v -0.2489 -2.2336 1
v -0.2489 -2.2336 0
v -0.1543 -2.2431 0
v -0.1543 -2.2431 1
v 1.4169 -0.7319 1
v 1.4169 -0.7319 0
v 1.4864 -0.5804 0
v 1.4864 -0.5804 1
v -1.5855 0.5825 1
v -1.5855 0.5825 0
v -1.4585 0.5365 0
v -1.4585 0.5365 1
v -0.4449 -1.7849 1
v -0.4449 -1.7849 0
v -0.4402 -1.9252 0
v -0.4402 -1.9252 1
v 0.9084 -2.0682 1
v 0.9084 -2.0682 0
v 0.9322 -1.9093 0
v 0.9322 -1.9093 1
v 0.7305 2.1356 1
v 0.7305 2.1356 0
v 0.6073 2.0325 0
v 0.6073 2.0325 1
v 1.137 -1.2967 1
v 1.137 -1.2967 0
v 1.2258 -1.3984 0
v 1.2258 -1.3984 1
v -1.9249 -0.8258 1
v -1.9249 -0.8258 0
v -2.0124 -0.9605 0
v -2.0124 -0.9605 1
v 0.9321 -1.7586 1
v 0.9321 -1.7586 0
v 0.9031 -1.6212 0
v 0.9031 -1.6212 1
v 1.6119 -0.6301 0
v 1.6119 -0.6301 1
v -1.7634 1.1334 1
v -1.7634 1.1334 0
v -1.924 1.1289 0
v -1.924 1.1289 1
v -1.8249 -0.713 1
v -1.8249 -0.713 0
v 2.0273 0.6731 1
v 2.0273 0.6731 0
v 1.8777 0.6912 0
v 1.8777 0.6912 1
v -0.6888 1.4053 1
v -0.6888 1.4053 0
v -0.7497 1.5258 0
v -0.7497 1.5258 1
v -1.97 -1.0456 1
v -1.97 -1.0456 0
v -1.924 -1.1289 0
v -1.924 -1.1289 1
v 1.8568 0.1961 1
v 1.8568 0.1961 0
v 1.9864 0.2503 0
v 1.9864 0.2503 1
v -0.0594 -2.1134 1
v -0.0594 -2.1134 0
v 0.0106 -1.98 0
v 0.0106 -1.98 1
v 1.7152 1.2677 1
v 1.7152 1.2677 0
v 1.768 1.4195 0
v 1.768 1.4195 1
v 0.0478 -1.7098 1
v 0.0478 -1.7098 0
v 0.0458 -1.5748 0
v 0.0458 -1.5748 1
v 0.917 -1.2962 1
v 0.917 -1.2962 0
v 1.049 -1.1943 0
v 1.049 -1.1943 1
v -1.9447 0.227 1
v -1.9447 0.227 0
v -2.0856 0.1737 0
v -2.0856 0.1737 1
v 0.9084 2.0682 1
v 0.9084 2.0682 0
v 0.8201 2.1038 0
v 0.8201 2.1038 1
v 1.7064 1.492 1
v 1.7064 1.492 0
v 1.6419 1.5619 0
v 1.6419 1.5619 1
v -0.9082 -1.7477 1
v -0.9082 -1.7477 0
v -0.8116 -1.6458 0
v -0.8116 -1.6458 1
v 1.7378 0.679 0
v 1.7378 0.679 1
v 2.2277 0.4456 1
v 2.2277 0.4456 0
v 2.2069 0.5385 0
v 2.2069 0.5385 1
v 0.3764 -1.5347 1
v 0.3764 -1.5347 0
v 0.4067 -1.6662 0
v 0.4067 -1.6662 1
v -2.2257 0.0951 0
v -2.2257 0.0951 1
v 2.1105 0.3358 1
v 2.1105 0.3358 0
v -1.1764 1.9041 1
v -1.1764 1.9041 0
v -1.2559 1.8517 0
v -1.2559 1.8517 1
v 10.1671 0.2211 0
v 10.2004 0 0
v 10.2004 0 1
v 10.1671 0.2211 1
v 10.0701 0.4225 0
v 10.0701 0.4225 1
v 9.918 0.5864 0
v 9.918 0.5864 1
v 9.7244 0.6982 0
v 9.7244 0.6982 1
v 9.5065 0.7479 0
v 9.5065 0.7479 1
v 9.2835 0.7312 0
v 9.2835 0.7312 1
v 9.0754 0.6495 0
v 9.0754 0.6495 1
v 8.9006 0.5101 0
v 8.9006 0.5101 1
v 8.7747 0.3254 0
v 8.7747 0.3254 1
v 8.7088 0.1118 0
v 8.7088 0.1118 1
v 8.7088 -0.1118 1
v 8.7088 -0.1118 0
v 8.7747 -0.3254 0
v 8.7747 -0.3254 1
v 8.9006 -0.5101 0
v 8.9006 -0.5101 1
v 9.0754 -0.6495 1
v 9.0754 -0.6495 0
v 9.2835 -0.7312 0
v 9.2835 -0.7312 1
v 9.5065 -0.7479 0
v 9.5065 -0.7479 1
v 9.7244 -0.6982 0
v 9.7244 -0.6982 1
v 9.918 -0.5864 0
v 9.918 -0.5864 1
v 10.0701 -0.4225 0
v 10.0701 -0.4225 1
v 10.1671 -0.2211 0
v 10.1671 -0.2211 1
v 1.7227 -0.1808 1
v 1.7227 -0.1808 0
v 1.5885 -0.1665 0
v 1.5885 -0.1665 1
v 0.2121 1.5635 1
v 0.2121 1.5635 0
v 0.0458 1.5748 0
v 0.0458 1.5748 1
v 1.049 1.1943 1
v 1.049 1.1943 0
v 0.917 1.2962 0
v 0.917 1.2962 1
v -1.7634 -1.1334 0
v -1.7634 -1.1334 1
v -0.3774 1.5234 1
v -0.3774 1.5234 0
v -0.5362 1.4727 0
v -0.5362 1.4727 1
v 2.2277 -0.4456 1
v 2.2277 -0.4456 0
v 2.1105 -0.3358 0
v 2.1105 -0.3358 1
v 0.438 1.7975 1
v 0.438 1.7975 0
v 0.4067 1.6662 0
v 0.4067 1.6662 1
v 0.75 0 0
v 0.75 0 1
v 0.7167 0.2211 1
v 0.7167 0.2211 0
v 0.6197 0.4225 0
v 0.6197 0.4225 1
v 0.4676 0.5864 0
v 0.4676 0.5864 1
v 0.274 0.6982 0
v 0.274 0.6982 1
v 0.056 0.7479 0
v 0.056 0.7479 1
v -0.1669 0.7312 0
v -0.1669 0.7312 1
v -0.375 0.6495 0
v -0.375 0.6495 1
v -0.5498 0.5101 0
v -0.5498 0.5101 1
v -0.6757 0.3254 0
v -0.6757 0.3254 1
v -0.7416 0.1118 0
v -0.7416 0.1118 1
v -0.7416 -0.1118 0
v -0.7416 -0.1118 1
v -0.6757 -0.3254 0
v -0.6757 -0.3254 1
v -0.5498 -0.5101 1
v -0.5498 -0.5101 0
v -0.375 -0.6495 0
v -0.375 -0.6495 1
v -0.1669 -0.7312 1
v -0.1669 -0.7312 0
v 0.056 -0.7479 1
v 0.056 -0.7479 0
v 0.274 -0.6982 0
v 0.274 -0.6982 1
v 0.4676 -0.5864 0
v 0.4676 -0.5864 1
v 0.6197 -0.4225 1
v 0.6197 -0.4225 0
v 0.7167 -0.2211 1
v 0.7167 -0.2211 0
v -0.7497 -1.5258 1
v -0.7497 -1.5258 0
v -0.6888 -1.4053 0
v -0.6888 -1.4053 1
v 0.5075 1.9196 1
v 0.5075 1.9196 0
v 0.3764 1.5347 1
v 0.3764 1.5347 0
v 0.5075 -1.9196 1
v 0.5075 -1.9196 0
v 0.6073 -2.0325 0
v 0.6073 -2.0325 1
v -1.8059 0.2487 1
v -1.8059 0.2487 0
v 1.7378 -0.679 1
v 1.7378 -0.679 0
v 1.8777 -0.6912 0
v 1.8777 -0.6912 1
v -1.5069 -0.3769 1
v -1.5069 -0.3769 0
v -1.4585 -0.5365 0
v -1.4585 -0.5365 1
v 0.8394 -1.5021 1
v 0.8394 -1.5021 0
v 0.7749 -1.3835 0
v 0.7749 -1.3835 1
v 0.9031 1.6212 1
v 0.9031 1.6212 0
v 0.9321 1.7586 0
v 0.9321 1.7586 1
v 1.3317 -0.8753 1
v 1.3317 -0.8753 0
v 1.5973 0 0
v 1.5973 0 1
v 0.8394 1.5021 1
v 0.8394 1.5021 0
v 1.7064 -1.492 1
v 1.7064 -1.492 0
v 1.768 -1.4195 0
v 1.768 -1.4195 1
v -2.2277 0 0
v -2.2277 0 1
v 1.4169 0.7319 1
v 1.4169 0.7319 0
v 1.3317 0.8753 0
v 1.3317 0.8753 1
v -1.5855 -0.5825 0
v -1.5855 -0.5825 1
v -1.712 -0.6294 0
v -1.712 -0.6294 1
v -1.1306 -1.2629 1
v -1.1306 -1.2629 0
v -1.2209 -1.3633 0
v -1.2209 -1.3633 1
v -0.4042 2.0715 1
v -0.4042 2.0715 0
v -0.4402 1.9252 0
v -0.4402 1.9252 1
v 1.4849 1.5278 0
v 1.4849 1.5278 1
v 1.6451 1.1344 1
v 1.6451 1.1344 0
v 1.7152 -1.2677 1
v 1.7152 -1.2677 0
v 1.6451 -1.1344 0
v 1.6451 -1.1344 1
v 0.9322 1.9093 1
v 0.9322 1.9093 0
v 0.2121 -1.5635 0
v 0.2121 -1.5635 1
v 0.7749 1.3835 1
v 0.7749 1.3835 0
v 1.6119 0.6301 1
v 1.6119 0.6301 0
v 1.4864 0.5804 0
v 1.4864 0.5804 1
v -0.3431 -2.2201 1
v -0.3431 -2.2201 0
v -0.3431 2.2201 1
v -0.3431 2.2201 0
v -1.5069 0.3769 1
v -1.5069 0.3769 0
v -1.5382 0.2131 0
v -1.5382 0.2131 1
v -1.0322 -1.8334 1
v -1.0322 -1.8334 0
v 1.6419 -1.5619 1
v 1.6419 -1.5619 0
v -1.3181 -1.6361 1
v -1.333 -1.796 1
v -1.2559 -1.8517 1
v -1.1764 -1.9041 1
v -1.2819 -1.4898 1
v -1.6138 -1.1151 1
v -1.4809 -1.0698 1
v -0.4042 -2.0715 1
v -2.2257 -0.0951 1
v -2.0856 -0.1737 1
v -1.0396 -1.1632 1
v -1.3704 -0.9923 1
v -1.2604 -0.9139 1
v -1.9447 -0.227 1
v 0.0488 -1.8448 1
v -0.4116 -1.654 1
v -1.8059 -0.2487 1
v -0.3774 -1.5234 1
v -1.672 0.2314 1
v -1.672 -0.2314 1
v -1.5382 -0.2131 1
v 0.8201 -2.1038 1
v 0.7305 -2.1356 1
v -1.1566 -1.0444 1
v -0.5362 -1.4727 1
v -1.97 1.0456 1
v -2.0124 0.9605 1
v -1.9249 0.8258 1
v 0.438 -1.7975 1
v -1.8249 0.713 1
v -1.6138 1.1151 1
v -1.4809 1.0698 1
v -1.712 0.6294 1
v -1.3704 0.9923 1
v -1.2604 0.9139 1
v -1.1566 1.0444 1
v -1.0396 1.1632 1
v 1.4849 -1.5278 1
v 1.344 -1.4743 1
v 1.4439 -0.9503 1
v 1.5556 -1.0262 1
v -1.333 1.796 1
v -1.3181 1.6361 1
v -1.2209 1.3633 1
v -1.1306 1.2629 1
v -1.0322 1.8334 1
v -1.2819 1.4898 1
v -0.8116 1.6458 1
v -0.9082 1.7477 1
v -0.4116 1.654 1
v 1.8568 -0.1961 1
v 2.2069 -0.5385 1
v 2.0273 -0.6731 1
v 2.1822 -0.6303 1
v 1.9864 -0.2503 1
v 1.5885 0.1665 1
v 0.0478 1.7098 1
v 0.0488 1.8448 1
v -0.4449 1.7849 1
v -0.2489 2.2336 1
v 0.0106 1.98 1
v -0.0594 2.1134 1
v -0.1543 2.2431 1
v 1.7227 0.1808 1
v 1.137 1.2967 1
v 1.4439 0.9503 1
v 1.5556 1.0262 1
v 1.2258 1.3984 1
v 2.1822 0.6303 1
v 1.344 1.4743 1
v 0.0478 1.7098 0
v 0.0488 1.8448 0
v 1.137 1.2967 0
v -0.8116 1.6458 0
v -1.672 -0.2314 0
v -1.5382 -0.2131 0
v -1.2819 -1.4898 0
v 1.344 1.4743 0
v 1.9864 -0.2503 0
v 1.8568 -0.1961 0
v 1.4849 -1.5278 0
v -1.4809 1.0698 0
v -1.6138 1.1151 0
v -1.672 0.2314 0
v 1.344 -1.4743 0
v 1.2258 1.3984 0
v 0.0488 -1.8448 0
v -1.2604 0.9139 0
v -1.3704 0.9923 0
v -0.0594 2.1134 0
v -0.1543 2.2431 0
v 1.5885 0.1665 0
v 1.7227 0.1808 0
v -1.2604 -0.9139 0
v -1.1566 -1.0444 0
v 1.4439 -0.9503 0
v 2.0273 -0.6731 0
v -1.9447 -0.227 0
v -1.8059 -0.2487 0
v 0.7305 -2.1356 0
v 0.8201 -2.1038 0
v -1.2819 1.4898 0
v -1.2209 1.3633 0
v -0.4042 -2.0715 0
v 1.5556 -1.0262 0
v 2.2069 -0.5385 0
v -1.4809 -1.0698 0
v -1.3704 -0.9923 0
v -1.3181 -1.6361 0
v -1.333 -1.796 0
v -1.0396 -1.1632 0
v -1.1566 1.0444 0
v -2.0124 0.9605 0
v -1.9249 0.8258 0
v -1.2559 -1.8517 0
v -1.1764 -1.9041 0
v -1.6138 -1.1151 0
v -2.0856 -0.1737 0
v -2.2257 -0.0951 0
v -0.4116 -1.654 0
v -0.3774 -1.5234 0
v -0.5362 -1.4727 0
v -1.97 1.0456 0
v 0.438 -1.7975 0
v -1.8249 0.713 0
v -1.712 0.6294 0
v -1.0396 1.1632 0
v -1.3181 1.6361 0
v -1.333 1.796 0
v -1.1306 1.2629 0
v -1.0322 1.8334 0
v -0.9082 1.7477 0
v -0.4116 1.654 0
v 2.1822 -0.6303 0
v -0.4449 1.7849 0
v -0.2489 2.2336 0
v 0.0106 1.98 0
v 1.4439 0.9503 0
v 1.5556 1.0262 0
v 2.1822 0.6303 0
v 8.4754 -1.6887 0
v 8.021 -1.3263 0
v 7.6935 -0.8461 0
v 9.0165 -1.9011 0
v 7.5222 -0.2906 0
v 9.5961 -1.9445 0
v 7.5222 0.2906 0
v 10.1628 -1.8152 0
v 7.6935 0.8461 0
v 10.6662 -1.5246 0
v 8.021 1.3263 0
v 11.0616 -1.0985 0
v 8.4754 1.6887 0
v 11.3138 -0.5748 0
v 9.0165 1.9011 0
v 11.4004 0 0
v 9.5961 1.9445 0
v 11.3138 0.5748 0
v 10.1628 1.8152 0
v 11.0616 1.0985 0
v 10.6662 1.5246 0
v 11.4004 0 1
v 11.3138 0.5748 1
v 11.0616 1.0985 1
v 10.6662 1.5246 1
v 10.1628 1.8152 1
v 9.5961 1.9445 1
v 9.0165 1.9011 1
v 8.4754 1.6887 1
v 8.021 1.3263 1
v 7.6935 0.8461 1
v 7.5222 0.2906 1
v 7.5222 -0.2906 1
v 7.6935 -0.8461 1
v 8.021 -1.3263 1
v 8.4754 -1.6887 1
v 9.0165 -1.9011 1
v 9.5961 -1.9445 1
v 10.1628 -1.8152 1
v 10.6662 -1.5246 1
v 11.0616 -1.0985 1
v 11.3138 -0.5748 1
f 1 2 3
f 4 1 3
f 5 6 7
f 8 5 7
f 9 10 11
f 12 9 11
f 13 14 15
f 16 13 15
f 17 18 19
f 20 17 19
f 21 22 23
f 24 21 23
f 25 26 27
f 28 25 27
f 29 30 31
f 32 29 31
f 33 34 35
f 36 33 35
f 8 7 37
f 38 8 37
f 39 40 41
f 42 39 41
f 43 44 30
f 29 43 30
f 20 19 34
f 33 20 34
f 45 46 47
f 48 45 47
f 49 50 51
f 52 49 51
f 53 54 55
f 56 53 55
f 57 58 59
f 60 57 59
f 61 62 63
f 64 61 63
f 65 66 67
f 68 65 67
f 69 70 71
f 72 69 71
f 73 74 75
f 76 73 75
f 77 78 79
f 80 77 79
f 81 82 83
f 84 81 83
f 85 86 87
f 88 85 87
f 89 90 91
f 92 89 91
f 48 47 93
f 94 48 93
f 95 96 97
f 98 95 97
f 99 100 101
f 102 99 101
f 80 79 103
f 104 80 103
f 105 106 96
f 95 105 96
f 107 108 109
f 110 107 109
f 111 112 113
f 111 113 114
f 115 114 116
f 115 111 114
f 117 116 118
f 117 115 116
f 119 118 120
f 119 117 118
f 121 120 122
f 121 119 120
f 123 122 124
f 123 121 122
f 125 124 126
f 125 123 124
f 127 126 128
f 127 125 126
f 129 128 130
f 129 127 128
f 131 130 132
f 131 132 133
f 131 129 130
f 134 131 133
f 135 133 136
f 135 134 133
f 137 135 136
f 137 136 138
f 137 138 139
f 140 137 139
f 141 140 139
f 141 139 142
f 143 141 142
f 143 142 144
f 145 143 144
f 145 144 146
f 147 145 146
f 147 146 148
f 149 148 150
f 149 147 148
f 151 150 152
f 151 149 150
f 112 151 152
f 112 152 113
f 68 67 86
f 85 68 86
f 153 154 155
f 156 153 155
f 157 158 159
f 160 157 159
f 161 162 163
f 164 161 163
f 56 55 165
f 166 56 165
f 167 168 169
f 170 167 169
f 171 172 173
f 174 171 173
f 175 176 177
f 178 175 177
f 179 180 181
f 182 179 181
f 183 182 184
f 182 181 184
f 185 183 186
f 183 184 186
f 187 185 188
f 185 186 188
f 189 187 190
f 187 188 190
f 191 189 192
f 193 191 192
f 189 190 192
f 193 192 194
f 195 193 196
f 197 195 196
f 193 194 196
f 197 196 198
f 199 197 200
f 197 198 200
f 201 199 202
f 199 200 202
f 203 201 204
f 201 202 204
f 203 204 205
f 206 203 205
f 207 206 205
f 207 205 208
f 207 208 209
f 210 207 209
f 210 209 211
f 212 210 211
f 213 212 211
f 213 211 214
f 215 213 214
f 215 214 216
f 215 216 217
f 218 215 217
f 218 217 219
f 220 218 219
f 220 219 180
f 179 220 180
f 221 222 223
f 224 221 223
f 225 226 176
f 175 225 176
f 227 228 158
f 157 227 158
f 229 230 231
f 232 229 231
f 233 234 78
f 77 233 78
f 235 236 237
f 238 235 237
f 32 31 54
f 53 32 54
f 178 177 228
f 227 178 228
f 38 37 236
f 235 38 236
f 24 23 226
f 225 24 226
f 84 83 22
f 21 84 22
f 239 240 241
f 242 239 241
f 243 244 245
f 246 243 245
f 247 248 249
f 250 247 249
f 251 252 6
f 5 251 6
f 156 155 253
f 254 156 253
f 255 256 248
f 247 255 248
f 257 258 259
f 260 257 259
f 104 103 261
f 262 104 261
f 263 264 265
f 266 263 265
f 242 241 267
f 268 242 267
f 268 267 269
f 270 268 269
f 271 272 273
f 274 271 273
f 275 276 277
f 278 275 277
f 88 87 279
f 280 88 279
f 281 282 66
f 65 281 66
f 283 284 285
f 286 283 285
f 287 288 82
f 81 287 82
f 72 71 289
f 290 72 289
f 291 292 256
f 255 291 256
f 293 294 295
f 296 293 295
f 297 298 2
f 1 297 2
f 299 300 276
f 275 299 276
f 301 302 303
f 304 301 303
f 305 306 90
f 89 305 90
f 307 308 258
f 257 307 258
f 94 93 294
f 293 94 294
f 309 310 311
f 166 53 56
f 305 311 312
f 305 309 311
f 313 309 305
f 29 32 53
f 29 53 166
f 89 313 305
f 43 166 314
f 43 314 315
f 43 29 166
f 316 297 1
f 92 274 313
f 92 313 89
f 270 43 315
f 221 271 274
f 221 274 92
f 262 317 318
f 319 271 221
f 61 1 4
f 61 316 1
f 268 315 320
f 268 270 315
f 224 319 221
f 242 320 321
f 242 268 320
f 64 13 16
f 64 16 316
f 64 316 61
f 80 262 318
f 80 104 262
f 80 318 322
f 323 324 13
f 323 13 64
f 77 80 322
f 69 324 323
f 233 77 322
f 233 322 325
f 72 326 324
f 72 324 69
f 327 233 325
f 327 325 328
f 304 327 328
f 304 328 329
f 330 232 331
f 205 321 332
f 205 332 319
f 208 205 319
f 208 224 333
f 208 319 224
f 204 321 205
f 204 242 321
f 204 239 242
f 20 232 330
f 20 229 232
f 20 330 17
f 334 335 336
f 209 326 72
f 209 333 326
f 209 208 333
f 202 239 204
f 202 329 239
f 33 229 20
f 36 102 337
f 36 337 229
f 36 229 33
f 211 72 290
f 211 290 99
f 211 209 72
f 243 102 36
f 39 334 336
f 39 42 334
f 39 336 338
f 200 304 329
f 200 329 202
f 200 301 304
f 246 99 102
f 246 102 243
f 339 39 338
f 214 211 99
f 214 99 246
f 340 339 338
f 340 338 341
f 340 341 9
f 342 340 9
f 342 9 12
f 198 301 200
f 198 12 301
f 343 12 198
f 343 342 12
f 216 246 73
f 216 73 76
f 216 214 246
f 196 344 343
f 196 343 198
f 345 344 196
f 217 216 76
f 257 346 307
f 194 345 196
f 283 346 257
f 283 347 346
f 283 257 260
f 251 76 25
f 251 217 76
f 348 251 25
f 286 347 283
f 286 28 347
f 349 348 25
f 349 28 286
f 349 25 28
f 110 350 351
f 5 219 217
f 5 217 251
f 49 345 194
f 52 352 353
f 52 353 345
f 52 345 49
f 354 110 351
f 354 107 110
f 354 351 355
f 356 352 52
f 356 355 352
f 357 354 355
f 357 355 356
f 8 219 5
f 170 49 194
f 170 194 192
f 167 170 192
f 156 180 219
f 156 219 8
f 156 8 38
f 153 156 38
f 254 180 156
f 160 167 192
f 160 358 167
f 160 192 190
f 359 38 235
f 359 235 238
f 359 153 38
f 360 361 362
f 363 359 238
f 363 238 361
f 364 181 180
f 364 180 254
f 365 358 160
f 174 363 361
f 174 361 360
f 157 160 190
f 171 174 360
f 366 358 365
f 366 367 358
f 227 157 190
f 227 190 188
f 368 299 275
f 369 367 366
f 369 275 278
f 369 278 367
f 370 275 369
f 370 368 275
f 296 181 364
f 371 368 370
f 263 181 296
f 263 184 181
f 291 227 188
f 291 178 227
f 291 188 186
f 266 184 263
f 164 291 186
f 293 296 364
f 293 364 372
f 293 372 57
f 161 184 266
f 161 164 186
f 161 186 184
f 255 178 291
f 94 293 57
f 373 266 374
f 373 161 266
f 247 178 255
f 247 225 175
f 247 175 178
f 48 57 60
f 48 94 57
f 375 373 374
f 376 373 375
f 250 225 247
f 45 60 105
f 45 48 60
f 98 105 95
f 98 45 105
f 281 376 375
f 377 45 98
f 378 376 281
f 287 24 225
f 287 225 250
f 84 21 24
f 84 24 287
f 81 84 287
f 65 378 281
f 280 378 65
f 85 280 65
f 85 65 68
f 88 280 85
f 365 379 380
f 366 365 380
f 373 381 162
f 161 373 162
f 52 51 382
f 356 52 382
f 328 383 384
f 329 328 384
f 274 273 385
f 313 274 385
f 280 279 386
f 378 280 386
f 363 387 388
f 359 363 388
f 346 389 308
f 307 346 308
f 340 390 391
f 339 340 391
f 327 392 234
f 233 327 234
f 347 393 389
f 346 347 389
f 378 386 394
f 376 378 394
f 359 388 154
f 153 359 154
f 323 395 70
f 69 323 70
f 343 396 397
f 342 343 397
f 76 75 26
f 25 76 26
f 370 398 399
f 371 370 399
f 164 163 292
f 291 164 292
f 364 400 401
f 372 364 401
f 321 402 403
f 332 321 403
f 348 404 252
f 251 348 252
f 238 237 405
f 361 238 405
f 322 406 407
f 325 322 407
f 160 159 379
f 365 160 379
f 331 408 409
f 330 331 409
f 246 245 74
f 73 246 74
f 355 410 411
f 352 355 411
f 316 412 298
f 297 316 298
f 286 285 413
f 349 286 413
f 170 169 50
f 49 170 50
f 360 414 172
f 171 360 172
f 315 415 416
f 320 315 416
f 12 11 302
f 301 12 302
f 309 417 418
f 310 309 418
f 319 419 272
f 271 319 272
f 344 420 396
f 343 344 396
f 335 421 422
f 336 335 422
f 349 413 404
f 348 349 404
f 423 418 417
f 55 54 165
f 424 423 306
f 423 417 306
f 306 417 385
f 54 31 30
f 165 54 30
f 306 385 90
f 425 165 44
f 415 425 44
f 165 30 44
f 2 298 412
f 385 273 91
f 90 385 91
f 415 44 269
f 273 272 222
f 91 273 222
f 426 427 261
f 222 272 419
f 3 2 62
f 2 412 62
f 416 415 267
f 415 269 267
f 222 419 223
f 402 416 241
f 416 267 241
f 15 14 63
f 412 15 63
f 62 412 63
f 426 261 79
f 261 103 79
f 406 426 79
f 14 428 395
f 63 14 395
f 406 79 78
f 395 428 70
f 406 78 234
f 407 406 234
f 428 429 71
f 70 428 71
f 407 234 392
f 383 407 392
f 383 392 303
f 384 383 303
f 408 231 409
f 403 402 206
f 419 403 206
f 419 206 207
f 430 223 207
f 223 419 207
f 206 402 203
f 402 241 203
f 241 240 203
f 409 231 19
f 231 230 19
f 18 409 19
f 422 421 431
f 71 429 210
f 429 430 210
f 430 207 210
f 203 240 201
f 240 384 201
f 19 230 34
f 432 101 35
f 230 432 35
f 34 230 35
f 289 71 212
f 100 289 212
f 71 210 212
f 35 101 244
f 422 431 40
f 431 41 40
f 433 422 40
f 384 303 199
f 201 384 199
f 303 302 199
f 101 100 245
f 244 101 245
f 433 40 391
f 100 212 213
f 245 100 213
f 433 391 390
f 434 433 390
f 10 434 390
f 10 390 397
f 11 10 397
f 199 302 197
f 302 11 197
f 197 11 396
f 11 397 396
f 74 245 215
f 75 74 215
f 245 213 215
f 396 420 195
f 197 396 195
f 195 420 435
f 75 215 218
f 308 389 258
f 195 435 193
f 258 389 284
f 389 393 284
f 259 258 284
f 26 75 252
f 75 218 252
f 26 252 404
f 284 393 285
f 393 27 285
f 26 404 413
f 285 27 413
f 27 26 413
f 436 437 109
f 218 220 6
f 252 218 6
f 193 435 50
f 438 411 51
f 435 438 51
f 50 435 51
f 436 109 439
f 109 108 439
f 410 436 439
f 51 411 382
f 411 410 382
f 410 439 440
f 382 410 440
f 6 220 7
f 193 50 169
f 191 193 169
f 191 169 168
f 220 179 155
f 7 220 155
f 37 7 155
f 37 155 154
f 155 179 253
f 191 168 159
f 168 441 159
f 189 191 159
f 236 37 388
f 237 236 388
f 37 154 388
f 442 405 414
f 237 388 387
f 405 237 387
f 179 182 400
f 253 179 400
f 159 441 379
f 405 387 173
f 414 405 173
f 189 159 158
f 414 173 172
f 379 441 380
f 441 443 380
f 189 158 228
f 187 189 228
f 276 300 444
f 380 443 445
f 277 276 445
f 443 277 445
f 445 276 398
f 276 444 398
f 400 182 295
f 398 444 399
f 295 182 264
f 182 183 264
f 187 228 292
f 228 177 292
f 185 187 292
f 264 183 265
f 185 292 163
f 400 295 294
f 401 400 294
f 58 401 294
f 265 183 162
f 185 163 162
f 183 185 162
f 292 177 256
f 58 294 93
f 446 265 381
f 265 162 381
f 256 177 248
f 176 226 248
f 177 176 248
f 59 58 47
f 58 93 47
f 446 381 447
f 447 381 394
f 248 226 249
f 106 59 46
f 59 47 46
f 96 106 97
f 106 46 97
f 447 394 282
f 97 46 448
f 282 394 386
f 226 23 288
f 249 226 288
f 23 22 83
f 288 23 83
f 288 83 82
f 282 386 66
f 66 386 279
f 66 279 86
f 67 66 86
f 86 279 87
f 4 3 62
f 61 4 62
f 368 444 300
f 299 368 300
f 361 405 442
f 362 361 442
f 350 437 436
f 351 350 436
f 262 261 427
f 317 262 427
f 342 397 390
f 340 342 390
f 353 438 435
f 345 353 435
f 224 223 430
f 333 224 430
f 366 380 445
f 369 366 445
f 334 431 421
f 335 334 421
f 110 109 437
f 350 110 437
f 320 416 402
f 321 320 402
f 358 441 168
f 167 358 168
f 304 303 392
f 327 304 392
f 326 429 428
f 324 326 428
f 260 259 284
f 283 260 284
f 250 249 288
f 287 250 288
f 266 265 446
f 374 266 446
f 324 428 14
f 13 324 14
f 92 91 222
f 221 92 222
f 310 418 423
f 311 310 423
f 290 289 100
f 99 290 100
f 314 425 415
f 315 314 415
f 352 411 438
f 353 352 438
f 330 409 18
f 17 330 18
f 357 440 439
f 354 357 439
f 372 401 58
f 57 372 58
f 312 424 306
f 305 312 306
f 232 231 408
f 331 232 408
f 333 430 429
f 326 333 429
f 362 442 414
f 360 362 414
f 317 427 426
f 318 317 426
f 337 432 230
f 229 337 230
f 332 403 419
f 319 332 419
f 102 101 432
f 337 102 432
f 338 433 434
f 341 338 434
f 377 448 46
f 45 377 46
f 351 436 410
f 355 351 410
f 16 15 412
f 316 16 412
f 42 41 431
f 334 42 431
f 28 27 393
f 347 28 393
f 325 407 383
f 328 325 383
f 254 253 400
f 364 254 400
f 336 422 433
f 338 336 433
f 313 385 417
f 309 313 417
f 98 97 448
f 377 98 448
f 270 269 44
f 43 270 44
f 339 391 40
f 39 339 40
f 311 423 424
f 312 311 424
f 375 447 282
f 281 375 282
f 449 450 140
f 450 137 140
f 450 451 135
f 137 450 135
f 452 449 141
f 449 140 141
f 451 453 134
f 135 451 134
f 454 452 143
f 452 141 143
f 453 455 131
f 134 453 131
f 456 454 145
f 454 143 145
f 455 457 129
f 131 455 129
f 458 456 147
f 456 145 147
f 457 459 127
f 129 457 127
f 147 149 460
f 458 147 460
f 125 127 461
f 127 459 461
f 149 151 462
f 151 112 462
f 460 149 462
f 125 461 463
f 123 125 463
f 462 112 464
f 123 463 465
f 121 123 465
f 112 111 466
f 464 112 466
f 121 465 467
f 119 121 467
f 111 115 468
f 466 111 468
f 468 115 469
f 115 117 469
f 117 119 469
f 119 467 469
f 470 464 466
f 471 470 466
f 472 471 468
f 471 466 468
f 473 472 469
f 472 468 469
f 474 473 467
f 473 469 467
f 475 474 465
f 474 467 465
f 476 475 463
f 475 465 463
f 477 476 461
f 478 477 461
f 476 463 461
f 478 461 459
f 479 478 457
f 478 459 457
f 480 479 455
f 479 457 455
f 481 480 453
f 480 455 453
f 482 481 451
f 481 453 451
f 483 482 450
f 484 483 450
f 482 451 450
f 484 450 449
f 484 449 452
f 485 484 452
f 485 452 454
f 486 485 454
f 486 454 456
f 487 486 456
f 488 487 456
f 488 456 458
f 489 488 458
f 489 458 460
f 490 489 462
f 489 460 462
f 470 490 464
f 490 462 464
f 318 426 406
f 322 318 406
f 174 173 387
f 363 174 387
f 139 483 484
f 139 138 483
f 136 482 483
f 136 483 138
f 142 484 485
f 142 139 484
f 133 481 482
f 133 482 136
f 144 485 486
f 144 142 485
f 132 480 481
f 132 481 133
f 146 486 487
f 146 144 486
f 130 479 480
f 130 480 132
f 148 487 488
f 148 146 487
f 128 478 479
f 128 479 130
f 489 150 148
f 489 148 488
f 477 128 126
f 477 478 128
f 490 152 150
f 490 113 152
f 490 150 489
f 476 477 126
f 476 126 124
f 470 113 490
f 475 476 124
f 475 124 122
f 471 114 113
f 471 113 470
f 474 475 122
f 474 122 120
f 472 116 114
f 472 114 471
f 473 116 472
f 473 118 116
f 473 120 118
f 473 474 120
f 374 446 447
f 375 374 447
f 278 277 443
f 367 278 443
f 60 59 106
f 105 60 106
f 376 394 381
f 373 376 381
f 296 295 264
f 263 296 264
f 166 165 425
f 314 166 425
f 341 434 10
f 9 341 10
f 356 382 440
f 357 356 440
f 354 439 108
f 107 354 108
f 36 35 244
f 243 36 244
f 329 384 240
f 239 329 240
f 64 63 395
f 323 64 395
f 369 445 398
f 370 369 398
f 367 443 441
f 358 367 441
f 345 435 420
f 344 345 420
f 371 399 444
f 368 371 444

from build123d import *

# Parameters (mm, degrees)
F1_DEPTH = 1
F2_R     = 0.75
F3_DEPTH = 25
F4_R     = 1.95
F4_R_2   = 0.75
F5_DEPTH = 1


with BuildPart() as f1:
    # F0 (on Top) → F1 (new body)
    with BuildSketch(Plane.XY):
        Polygon((1.588458, -0.166522), (1.597286, 0), (1.588458, 0.166522), (1.722702, 0.180795), (1.85684, 0.196052), (1.986405, 0.250272), (2.11046, 0.335787), (2.227713, 0.445634), (2.206905, 0.53846), (2.182192, 0.630324), (2.027321, 0.673098), (1.877734, 0.691167), (1.737813, 0.678965), (1.611949, 0.630136), (1.486449, 0.580389), (1.416879, 0.731939), (1.331676, 0.875284), (1.44391, 0.950309), (1.555593, 1.026155), (1.64512, 1.134377), (1.715224, 1.267748), (1.767998, 1.419503), (1.706435, 1.492026), (1.641861, 1.561882), (1.484852, 1.527785), (1.344003, 1.474268), (1.225779, 1.398438), (1.137024, 1.296711), (1.049018, 1.194339), (0.916988, 1.2962), (0.774928, 1.38353), (0.839441, 1.502118), (0.903084, 1.621178), (0.932063, 1.758609), (0.932157, 1.909283), (0.908362, 2.06818), (0.820147, 2.103787), (0.730506, 2.135632), (0.607326, 2.032475), (0.507482, 1.919632), (0.438039, 1.797547), (0.406725, 1.666225), (0.376375, 1.534681), (0.212131, 1.563516), (0.04576, 1.574825), (0.047772, 1.70981), (0.048795, 1.84481), (0.010587, 1.979965), (-0.059351, 2.113424), (-0.154264, 2.243063), (-0.248922, 2.233595), (-0.343094, 2.220135), (-0.404224, 2.071549), (-0.440192, 1.925231), (-0.444944, 1.784859), (-0.411643, 1.654027), (-0.377386, 1.523446), (-0.536217, 1.472651), (-0.688787, 1.405347), (-0.749736, 1.525805), (-0.811567, 1.645817), (-0.908209, 1.747736), (-1.032157, 1.833405), (-1.176445, 1.904086), (-1.25586, 1.851714), (-1.33299, 1.796031), (-1.318067, 1.636056), (-1.281917, 1.489783), (-1.220891, 1.363281), (-1.130604, 1.262911), (-1.039586, 1.163208), (-1.156618, 1.044418), (-1.260435, 0.913921), (-1.370383, 0.992257), (-1.480904, 1.069788), (-1.613839, 1.115121), (-1.763403, 1.133375), (-1.92401, 1.128907), (-1.96999, 1.045627), (-2.012408, 0.960478), (-1.924851, 0.825763), (-1.824865, 0.713044), (-1.712041, 0.629392), (-1.585451, 0.582478), (-1.458525, 0.536493), (-1.506947, 0.376922), (-1.538227, 0.213127), (-1.671986, 0.231395), (-1.805878, 0.248683), (-1.944653, 0.227045), (-2.085569, 0.173703), (-2.225703, 0.095108), (-2.227714, 0), (-2.225703, -0.095108), (-2.085569, -0.173703), (-1.944653, -0.227045), (-1.805878, -0.248683), (-1.671986, -0.231395), (-1.538227, -0.213127), (-1.506947, -0.376922), (-1.458525, -0.536493), (-1.585451, -0.582478), (-1.712041, -0.629392), (-1.824865, -0.713044), (-1.924851, -0.825763), (-2.012408, -0.960478), (-1.96999, -1.045627), (-1.92401, -1.128907), (-1.763403, -1.133375), (-1.613839, -1.115121), (-1.480904, -1.069788), (-1.370383, -0.992257), (-1.260435, -0.913921), (-1.156618, -1.044418), (-1.039586, -1.163208), (-1.130604, -1.262911), (-1.220891, -1.363281), (-1.281917, -1.489783), (-1.318067, -1.636056), (-1.33299, -1.796031), (-1.25586, -1.851714), (-1.176445, -1.904086), (-1.032157, -1.833405), (-0.908209, -1.747736), (-0.811567, -1.645817), (-0.749736, -1.525805), (-0.688787, -1.405347), (-0.536217, -1.472651), (-0.377386, -1.523446), (-0.411643, -1.654027), (-0.444944, -1.784859), (-0.440192, -1.925231), (-0.404224, -2.071549), (-0.343094, -2.220135), (-0.248922, -2.233595), (-0.154264, -2.243063), (-0.059351, -2.113424), (0.010587, -1.979965), (0.048795, -1.84481), (0.047772, -1.70981), (0.04576, -1.574825), (0.212131, -1.563516), (0.376375, -1.534681), (0.406725, -1.666225), (0.438039, -1.797547), (0.507482, -1.919632), (0.607326, -2.032475), (0.730506, -2.135632), (0.820147, -2.103787), (0.908362, -2.06818), (0.932157, -1.909283), (0.932063, -1.758609), (0.903084, -1.621178), (0.839441, -1.502118), (0.774928, -1.38353), (0.916988, -1.2962), (1.049018, -1.194339), (1.137024, -1.296711), (1.225779, -1.398438), (1.344003, -1.474268), (1.484852, -1.527785), (1.641861, -1.561882), (1.706435, -1.492026), (1.767998, -1.419503), (1.715224, -1.267748), (1.64512, -1.134377), (1.555593, -1.026155), (1.44391, -0.950309), (1.331676, -0.875284), (1.416879, -0.731939), (1.486449, -0.580389), (1.611949, -0.630136), (1.737813, -0.678965), (1.877734, -0.691167), (2.027321, -0.673098), (2.182192, -0.630324), (2.206905, -0.53846), (2.227713, -0.445634), (2.11046, -0.335787), (1.986405, -0.250272), (1.85684, -0.196052), (1.722702, -0.180795), align=None)
    extrude(amount=F1_DEPTH)

    # F2 (on face) → F3 (cut)
    with BuildSketch(Plane.XY.offset(1)):
        Circle(F2_R)
    extrude(amount=-F3_DEPTH, mode=Mode.SUBTRACT)


with BuildPart() as f5:
    # F4 (on Top) → F5 (new body)
    with BuildSketch(Plane.XY):
        with Locations((9.450426, 0)):
            Circle(F4_R)
        with Locations((9.450426, 0)):
            Circle(F4_R_2, mode=Mode.SUBTRACT)
    extrude(amount=F5_DEPTH)


solid = Compound([f1.part, f5.part])
